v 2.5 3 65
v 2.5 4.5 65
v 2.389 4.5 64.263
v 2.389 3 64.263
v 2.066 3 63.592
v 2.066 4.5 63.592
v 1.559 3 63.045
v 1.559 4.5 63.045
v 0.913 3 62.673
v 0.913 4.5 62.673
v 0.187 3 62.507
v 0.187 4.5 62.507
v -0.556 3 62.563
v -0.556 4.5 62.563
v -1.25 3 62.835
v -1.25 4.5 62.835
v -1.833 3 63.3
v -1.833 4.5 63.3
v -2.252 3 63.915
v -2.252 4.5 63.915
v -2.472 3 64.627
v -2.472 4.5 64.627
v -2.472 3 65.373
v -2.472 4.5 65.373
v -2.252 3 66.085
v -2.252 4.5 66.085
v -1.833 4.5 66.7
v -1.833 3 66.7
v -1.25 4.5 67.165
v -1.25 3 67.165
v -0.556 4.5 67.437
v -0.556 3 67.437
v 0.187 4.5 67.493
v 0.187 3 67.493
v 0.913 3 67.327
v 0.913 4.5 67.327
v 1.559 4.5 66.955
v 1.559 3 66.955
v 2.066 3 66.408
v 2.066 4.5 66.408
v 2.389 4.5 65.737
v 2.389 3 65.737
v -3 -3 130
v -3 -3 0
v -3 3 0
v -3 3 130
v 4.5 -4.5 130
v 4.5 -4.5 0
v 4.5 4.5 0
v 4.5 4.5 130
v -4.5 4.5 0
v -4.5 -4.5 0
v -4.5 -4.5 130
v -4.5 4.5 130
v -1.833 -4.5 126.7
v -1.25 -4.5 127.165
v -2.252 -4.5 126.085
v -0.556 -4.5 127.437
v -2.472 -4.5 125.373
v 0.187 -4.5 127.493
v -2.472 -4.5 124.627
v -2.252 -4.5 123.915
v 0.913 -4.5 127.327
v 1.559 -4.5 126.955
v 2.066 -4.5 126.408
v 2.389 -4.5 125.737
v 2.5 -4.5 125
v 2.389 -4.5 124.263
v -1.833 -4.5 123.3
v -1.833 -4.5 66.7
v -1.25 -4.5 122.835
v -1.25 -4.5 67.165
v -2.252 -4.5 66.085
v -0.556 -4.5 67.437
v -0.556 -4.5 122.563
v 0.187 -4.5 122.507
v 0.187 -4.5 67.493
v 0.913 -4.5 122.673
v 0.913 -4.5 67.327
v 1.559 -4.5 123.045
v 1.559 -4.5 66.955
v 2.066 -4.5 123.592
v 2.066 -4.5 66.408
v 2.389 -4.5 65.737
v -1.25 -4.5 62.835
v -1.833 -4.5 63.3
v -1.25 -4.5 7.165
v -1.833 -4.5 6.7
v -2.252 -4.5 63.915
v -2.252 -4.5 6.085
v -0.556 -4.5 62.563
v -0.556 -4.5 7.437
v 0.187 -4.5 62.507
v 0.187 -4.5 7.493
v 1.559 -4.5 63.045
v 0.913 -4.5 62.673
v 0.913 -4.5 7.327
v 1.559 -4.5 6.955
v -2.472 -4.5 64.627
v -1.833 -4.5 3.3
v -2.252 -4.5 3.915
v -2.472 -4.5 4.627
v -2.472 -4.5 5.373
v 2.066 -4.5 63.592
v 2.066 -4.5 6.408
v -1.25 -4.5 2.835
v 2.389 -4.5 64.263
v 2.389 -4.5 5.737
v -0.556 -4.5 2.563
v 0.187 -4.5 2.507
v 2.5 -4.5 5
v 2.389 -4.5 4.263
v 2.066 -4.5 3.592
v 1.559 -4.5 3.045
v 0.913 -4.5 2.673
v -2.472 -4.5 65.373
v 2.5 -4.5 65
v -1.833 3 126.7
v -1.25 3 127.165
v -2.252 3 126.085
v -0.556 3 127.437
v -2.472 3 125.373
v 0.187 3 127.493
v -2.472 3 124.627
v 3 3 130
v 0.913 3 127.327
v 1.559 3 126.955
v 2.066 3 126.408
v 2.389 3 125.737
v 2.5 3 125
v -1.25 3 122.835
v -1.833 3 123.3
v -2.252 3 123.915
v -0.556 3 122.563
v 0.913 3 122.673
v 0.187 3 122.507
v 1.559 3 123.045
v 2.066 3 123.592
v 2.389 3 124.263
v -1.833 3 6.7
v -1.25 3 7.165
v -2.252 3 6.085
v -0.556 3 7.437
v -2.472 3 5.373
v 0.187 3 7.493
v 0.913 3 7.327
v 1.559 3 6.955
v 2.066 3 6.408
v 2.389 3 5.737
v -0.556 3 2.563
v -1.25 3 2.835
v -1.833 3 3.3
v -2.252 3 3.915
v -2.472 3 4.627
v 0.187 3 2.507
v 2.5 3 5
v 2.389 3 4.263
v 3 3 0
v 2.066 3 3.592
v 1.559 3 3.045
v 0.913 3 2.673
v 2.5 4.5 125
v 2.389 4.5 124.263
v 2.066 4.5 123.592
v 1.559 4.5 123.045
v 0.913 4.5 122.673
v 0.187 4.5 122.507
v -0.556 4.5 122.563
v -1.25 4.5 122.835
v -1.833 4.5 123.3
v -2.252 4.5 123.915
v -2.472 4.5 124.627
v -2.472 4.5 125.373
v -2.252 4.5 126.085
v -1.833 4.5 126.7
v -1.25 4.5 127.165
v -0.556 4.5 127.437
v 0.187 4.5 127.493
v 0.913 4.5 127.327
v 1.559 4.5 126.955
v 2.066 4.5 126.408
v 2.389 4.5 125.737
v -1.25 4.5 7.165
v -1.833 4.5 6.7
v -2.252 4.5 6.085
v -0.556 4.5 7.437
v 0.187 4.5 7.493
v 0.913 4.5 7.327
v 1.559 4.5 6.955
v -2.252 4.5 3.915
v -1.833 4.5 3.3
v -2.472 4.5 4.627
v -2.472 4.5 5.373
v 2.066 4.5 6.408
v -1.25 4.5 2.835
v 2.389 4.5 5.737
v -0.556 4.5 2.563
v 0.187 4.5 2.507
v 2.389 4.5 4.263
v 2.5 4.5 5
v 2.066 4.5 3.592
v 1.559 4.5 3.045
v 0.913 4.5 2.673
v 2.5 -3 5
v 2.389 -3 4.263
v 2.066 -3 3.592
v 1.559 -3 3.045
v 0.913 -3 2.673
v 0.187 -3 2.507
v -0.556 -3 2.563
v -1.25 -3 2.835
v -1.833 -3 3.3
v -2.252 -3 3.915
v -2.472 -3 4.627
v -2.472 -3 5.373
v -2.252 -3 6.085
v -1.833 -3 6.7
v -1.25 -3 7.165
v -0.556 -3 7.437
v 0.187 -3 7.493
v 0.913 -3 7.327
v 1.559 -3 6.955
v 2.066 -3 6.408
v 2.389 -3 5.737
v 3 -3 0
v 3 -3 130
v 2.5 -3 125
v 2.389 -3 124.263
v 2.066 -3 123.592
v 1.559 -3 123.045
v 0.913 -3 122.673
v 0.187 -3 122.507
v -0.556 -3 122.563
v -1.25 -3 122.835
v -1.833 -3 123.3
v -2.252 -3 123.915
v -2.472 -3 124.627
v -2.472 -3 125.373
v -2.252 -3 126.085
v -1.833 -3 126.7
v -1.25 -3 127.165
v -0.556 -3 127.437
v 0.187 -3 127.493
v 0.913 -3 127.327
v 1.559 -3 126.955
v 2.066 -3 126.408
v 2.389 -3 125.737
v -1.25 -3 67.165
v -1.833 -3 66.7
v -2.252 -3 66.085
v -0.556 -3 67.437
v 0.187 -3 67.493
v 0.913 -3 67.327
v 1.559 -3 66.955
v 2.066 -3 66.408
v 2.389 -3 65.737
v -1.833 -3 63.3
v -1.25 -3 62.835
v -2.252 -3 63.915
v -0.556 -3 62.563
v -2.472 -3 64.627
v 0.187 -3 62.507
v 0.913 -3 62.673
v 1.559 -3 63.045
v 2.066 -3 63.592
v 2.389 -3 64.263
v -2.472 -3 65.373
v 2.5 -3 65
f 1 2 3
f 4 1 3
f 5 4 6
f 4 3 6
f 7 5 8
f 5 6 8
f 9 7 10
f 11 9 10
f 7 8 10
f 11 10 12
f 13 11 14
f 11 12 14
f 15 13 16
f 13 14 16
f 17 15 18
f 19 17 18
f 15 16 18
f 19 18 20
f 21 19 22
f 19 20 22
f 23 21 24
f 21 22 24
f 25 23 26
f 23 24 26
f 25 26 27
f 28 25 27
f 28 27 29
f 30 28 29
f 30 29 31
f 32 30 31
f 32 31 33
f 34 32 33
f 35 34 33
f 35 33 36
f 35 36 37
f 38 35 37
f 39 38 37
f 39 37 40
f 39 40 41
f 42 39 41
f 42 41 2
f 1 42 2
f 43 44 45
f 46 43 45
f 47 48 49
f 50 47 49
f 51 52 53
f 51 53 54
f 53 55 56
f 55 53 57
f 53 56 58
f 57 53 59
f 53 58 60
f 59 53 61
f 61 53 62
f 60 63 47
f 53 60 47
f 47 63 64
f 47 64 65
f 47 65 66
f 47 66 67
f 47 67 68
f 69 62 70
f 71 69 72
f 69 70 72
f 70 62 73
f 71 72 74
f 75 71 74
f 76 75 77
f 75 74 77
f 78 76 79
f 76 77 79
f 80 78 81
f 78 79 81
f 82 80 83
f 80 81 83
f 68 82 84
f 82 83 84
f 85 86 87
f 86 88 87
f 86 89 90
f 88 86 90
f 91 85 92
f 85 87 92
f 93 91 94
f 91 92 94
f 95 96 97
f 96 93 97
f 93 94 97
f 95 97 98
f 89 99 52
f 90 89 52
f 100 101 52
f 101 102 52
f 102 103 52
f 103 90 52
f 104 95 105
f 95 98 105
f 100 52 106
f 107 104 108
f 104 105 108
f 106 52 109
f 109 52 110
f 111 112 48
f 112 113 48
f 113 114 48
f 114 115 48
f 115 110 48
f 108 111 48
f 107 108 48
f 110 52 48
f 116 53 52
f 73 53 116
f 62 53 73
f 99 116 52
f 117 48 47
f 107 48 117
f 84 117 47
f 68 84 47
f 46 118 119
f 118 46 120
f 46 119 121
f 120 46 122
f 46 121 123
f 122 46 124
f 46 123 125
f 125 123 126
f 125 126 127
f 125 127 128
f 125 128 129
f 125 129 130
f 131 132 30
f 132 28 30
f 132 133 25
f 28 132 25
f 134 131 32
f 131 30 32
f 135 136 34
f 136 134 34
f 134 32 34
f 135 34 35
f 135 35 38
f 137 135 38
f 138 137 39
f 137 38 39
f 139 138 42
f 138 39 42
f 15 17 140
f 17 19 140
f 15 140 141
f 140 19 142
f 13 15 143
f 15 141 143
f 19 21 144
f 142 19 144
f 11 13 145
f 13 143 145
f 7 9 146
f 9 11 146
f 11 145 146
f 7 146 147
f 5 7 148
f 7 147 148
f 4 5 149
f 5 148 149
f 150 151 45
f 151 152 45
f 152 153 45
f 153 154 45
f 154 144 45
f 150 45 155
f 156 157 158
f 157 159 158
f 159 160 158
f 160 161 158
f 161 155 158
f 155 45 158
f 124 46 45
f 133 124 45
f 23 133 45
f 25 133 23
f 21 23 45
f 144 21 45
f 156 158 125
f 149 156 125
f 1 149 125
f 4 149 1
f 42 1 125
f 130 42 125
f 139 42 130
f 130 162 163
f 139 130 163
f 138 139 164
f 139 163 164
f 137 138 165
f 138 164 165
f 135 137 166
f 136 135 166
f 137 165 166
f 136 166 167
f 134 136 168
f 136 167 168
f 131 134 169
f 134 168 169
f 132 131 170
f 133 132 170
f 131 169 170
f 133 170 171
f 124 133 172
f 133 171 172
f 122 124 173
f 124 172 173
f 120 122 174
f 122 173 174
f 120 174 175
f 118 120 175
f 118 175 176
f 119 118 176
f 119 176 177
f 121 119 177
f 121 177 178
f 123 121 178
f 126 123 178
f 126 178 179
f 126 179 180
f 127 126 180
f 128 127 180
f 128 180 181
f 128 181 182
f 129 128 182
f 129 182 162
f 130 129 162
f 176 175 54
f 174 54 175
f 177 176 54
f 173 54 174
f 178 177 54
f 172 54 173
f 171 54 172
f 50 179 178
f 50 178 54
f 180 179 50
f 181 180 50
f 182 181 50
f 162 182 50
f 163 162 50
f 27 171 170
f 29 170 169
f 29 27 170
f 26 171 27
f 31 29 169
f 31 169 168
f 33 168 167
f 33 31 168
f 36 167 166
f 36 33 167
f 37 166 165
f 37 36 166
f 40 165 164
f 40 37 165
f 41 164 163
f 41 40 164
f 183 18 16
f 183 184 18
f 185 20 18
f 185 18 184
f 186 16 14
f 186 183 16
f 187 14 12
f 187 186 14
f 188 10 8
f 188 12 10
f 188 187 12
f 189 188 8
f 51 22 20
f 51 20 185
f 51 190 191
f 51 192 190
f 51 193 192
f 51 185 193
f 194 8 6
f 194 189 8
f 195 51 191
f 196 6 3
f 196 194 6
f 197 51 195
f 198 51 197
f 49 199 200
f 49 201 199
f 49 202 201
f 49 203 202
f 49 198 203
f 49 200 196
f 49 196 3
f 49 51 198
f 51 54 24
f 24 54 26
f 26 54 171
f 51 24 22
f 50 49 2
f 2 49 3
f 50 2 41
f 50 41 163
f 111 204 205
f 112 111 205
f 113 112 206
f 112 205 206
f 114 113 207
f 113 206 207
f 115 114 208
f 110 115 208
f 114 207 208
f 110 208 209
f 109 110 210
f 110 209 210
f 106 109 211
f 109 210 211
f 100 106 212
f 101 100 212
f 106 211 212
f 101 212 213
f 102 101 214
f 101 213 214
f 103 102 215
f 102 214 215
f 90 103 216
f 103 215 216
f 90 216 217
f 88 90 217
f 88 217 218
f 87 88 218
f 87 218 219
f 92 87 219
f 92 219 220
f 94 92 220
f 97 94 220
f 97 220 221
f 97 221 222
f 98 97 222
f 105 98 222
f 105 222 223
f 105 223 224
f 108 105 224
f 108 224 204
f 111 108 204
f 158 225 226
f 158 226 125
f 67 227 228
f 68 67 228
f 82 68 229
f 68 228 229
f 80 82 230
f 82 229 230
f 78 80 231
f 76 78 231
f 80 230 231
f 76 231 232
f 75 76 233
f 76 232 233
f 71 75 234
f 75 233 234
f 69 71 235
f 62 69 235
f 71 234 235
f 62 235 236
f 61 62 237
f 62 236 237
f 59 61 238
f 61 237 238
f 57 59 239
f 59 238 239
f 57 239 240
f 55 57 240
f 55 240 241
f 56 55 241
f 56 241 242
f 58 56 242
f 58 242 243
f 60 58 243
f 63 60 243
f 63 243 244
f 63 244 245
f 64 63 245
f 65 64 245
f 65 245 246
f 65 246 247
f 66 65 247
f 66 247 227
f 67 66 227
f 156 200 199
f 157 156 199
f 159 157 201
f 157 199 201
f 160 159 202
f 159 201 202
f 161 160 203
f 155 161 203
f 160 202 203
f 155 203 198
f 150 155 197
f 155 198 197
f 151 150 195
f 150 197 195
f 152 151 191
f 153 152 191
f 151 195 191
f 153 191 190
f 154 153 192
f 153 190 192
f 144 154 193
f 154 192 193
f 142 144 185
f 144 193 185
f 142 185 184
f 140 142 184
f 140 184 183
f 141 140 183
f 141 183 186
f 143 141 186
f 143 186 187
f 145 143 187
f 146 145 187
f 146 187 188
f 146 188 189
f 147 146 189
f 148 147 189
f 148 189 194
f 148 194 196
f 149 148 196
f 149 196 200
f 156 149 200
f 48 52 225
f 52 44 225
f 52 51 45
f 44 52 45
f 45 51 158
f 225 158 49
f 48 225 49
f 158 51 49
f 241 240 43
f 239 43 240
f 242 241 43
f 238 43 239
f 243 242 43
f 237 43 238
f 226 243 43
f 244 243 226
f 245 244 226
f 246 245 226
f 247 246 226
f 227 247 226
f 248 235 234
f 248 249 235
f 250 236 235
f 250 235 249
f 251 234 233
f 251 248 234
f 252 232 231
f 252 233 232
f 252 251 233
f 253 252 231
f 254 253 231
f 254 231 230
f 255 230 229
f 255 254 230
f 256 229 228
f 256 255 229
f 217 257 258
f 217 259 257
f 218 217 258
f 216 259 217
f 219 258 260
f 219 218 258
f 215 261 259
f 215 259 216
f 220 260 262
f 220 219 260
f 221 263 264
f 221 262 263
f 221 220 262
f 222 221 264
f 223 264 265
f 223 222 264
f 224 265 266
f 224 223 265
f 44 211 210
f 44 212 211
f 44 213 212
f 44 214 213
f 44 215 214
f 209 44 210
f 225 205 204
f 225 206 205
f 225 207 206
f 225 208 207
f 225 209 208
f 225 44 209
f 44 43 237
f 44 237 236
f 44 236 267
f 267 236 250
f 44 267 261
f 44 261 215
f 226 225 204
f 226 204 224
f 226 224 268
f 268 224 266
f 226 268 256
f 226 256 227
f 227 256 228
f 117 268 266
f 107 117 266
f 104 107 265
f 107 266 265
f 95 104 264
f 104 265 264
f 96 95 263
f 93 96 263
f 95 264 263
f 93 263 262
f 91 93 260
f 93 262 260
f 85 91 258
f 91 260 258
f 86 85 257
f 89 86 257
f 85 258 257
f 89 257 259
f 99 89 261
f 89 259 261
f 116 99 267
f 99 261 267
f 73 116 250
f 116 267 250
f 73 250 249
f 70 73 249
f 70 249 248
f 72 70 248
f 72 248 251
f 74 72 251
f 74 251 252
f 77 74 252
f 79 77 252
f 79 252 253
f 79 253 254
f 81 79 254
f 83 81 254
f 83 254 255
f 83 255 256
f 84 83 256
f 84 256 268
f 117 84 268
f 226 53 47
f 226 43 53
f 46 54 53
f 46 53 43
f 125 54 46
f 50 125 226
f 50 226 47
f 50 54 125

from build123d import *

# Parameters (mm, degrees)
SKETCH_1_W          = 9
SKETCH_1_H          = 9
SKETCH_1_W_2        = 6
SKETCH_1_H_2        = 6
EXTRUDE_1_DEPTH     = 130
SKETCH_2_R          = 2.5
CUT_EXTRUDE_1_DEPTH = 90


with BuildPart() as part:
    # ｽｹｯﾁ1 → ﾎﾞｽ - 押し出し1 (new body)
    with BuildSketch(Plane.XY):
        Rectangle(SKETCH_1_W, SKETCH_1_H)
        Rectangle(SKETCH_1_W_2, SKETCH_1_H_2, mode=Mode.SUBTRACT)
    extrude(amount=EXTRUDE_1_DEPTH)

    # ｽｹｯﾁ2 → ｶｯﾄ - 押し出し1 (cut)
    with BuildSketch(Plane(origin=(0, 4.5, 0), x_dir=(1, 0, 0), z_dir=(0, 1, 0))):
        with Locations((0, -65)):
            Circle(SKETCH_2_R)
        with Locations((0, -5)):
            Circle(SKETCH_2_R)
        with Locations((0, -125)):
            Circle(SKETCH_2_R)
    extrude(amount=-CUT_EXTRUDE_1_DEPTH, mode=Mode.SUBTRACT)


solid = part.part
